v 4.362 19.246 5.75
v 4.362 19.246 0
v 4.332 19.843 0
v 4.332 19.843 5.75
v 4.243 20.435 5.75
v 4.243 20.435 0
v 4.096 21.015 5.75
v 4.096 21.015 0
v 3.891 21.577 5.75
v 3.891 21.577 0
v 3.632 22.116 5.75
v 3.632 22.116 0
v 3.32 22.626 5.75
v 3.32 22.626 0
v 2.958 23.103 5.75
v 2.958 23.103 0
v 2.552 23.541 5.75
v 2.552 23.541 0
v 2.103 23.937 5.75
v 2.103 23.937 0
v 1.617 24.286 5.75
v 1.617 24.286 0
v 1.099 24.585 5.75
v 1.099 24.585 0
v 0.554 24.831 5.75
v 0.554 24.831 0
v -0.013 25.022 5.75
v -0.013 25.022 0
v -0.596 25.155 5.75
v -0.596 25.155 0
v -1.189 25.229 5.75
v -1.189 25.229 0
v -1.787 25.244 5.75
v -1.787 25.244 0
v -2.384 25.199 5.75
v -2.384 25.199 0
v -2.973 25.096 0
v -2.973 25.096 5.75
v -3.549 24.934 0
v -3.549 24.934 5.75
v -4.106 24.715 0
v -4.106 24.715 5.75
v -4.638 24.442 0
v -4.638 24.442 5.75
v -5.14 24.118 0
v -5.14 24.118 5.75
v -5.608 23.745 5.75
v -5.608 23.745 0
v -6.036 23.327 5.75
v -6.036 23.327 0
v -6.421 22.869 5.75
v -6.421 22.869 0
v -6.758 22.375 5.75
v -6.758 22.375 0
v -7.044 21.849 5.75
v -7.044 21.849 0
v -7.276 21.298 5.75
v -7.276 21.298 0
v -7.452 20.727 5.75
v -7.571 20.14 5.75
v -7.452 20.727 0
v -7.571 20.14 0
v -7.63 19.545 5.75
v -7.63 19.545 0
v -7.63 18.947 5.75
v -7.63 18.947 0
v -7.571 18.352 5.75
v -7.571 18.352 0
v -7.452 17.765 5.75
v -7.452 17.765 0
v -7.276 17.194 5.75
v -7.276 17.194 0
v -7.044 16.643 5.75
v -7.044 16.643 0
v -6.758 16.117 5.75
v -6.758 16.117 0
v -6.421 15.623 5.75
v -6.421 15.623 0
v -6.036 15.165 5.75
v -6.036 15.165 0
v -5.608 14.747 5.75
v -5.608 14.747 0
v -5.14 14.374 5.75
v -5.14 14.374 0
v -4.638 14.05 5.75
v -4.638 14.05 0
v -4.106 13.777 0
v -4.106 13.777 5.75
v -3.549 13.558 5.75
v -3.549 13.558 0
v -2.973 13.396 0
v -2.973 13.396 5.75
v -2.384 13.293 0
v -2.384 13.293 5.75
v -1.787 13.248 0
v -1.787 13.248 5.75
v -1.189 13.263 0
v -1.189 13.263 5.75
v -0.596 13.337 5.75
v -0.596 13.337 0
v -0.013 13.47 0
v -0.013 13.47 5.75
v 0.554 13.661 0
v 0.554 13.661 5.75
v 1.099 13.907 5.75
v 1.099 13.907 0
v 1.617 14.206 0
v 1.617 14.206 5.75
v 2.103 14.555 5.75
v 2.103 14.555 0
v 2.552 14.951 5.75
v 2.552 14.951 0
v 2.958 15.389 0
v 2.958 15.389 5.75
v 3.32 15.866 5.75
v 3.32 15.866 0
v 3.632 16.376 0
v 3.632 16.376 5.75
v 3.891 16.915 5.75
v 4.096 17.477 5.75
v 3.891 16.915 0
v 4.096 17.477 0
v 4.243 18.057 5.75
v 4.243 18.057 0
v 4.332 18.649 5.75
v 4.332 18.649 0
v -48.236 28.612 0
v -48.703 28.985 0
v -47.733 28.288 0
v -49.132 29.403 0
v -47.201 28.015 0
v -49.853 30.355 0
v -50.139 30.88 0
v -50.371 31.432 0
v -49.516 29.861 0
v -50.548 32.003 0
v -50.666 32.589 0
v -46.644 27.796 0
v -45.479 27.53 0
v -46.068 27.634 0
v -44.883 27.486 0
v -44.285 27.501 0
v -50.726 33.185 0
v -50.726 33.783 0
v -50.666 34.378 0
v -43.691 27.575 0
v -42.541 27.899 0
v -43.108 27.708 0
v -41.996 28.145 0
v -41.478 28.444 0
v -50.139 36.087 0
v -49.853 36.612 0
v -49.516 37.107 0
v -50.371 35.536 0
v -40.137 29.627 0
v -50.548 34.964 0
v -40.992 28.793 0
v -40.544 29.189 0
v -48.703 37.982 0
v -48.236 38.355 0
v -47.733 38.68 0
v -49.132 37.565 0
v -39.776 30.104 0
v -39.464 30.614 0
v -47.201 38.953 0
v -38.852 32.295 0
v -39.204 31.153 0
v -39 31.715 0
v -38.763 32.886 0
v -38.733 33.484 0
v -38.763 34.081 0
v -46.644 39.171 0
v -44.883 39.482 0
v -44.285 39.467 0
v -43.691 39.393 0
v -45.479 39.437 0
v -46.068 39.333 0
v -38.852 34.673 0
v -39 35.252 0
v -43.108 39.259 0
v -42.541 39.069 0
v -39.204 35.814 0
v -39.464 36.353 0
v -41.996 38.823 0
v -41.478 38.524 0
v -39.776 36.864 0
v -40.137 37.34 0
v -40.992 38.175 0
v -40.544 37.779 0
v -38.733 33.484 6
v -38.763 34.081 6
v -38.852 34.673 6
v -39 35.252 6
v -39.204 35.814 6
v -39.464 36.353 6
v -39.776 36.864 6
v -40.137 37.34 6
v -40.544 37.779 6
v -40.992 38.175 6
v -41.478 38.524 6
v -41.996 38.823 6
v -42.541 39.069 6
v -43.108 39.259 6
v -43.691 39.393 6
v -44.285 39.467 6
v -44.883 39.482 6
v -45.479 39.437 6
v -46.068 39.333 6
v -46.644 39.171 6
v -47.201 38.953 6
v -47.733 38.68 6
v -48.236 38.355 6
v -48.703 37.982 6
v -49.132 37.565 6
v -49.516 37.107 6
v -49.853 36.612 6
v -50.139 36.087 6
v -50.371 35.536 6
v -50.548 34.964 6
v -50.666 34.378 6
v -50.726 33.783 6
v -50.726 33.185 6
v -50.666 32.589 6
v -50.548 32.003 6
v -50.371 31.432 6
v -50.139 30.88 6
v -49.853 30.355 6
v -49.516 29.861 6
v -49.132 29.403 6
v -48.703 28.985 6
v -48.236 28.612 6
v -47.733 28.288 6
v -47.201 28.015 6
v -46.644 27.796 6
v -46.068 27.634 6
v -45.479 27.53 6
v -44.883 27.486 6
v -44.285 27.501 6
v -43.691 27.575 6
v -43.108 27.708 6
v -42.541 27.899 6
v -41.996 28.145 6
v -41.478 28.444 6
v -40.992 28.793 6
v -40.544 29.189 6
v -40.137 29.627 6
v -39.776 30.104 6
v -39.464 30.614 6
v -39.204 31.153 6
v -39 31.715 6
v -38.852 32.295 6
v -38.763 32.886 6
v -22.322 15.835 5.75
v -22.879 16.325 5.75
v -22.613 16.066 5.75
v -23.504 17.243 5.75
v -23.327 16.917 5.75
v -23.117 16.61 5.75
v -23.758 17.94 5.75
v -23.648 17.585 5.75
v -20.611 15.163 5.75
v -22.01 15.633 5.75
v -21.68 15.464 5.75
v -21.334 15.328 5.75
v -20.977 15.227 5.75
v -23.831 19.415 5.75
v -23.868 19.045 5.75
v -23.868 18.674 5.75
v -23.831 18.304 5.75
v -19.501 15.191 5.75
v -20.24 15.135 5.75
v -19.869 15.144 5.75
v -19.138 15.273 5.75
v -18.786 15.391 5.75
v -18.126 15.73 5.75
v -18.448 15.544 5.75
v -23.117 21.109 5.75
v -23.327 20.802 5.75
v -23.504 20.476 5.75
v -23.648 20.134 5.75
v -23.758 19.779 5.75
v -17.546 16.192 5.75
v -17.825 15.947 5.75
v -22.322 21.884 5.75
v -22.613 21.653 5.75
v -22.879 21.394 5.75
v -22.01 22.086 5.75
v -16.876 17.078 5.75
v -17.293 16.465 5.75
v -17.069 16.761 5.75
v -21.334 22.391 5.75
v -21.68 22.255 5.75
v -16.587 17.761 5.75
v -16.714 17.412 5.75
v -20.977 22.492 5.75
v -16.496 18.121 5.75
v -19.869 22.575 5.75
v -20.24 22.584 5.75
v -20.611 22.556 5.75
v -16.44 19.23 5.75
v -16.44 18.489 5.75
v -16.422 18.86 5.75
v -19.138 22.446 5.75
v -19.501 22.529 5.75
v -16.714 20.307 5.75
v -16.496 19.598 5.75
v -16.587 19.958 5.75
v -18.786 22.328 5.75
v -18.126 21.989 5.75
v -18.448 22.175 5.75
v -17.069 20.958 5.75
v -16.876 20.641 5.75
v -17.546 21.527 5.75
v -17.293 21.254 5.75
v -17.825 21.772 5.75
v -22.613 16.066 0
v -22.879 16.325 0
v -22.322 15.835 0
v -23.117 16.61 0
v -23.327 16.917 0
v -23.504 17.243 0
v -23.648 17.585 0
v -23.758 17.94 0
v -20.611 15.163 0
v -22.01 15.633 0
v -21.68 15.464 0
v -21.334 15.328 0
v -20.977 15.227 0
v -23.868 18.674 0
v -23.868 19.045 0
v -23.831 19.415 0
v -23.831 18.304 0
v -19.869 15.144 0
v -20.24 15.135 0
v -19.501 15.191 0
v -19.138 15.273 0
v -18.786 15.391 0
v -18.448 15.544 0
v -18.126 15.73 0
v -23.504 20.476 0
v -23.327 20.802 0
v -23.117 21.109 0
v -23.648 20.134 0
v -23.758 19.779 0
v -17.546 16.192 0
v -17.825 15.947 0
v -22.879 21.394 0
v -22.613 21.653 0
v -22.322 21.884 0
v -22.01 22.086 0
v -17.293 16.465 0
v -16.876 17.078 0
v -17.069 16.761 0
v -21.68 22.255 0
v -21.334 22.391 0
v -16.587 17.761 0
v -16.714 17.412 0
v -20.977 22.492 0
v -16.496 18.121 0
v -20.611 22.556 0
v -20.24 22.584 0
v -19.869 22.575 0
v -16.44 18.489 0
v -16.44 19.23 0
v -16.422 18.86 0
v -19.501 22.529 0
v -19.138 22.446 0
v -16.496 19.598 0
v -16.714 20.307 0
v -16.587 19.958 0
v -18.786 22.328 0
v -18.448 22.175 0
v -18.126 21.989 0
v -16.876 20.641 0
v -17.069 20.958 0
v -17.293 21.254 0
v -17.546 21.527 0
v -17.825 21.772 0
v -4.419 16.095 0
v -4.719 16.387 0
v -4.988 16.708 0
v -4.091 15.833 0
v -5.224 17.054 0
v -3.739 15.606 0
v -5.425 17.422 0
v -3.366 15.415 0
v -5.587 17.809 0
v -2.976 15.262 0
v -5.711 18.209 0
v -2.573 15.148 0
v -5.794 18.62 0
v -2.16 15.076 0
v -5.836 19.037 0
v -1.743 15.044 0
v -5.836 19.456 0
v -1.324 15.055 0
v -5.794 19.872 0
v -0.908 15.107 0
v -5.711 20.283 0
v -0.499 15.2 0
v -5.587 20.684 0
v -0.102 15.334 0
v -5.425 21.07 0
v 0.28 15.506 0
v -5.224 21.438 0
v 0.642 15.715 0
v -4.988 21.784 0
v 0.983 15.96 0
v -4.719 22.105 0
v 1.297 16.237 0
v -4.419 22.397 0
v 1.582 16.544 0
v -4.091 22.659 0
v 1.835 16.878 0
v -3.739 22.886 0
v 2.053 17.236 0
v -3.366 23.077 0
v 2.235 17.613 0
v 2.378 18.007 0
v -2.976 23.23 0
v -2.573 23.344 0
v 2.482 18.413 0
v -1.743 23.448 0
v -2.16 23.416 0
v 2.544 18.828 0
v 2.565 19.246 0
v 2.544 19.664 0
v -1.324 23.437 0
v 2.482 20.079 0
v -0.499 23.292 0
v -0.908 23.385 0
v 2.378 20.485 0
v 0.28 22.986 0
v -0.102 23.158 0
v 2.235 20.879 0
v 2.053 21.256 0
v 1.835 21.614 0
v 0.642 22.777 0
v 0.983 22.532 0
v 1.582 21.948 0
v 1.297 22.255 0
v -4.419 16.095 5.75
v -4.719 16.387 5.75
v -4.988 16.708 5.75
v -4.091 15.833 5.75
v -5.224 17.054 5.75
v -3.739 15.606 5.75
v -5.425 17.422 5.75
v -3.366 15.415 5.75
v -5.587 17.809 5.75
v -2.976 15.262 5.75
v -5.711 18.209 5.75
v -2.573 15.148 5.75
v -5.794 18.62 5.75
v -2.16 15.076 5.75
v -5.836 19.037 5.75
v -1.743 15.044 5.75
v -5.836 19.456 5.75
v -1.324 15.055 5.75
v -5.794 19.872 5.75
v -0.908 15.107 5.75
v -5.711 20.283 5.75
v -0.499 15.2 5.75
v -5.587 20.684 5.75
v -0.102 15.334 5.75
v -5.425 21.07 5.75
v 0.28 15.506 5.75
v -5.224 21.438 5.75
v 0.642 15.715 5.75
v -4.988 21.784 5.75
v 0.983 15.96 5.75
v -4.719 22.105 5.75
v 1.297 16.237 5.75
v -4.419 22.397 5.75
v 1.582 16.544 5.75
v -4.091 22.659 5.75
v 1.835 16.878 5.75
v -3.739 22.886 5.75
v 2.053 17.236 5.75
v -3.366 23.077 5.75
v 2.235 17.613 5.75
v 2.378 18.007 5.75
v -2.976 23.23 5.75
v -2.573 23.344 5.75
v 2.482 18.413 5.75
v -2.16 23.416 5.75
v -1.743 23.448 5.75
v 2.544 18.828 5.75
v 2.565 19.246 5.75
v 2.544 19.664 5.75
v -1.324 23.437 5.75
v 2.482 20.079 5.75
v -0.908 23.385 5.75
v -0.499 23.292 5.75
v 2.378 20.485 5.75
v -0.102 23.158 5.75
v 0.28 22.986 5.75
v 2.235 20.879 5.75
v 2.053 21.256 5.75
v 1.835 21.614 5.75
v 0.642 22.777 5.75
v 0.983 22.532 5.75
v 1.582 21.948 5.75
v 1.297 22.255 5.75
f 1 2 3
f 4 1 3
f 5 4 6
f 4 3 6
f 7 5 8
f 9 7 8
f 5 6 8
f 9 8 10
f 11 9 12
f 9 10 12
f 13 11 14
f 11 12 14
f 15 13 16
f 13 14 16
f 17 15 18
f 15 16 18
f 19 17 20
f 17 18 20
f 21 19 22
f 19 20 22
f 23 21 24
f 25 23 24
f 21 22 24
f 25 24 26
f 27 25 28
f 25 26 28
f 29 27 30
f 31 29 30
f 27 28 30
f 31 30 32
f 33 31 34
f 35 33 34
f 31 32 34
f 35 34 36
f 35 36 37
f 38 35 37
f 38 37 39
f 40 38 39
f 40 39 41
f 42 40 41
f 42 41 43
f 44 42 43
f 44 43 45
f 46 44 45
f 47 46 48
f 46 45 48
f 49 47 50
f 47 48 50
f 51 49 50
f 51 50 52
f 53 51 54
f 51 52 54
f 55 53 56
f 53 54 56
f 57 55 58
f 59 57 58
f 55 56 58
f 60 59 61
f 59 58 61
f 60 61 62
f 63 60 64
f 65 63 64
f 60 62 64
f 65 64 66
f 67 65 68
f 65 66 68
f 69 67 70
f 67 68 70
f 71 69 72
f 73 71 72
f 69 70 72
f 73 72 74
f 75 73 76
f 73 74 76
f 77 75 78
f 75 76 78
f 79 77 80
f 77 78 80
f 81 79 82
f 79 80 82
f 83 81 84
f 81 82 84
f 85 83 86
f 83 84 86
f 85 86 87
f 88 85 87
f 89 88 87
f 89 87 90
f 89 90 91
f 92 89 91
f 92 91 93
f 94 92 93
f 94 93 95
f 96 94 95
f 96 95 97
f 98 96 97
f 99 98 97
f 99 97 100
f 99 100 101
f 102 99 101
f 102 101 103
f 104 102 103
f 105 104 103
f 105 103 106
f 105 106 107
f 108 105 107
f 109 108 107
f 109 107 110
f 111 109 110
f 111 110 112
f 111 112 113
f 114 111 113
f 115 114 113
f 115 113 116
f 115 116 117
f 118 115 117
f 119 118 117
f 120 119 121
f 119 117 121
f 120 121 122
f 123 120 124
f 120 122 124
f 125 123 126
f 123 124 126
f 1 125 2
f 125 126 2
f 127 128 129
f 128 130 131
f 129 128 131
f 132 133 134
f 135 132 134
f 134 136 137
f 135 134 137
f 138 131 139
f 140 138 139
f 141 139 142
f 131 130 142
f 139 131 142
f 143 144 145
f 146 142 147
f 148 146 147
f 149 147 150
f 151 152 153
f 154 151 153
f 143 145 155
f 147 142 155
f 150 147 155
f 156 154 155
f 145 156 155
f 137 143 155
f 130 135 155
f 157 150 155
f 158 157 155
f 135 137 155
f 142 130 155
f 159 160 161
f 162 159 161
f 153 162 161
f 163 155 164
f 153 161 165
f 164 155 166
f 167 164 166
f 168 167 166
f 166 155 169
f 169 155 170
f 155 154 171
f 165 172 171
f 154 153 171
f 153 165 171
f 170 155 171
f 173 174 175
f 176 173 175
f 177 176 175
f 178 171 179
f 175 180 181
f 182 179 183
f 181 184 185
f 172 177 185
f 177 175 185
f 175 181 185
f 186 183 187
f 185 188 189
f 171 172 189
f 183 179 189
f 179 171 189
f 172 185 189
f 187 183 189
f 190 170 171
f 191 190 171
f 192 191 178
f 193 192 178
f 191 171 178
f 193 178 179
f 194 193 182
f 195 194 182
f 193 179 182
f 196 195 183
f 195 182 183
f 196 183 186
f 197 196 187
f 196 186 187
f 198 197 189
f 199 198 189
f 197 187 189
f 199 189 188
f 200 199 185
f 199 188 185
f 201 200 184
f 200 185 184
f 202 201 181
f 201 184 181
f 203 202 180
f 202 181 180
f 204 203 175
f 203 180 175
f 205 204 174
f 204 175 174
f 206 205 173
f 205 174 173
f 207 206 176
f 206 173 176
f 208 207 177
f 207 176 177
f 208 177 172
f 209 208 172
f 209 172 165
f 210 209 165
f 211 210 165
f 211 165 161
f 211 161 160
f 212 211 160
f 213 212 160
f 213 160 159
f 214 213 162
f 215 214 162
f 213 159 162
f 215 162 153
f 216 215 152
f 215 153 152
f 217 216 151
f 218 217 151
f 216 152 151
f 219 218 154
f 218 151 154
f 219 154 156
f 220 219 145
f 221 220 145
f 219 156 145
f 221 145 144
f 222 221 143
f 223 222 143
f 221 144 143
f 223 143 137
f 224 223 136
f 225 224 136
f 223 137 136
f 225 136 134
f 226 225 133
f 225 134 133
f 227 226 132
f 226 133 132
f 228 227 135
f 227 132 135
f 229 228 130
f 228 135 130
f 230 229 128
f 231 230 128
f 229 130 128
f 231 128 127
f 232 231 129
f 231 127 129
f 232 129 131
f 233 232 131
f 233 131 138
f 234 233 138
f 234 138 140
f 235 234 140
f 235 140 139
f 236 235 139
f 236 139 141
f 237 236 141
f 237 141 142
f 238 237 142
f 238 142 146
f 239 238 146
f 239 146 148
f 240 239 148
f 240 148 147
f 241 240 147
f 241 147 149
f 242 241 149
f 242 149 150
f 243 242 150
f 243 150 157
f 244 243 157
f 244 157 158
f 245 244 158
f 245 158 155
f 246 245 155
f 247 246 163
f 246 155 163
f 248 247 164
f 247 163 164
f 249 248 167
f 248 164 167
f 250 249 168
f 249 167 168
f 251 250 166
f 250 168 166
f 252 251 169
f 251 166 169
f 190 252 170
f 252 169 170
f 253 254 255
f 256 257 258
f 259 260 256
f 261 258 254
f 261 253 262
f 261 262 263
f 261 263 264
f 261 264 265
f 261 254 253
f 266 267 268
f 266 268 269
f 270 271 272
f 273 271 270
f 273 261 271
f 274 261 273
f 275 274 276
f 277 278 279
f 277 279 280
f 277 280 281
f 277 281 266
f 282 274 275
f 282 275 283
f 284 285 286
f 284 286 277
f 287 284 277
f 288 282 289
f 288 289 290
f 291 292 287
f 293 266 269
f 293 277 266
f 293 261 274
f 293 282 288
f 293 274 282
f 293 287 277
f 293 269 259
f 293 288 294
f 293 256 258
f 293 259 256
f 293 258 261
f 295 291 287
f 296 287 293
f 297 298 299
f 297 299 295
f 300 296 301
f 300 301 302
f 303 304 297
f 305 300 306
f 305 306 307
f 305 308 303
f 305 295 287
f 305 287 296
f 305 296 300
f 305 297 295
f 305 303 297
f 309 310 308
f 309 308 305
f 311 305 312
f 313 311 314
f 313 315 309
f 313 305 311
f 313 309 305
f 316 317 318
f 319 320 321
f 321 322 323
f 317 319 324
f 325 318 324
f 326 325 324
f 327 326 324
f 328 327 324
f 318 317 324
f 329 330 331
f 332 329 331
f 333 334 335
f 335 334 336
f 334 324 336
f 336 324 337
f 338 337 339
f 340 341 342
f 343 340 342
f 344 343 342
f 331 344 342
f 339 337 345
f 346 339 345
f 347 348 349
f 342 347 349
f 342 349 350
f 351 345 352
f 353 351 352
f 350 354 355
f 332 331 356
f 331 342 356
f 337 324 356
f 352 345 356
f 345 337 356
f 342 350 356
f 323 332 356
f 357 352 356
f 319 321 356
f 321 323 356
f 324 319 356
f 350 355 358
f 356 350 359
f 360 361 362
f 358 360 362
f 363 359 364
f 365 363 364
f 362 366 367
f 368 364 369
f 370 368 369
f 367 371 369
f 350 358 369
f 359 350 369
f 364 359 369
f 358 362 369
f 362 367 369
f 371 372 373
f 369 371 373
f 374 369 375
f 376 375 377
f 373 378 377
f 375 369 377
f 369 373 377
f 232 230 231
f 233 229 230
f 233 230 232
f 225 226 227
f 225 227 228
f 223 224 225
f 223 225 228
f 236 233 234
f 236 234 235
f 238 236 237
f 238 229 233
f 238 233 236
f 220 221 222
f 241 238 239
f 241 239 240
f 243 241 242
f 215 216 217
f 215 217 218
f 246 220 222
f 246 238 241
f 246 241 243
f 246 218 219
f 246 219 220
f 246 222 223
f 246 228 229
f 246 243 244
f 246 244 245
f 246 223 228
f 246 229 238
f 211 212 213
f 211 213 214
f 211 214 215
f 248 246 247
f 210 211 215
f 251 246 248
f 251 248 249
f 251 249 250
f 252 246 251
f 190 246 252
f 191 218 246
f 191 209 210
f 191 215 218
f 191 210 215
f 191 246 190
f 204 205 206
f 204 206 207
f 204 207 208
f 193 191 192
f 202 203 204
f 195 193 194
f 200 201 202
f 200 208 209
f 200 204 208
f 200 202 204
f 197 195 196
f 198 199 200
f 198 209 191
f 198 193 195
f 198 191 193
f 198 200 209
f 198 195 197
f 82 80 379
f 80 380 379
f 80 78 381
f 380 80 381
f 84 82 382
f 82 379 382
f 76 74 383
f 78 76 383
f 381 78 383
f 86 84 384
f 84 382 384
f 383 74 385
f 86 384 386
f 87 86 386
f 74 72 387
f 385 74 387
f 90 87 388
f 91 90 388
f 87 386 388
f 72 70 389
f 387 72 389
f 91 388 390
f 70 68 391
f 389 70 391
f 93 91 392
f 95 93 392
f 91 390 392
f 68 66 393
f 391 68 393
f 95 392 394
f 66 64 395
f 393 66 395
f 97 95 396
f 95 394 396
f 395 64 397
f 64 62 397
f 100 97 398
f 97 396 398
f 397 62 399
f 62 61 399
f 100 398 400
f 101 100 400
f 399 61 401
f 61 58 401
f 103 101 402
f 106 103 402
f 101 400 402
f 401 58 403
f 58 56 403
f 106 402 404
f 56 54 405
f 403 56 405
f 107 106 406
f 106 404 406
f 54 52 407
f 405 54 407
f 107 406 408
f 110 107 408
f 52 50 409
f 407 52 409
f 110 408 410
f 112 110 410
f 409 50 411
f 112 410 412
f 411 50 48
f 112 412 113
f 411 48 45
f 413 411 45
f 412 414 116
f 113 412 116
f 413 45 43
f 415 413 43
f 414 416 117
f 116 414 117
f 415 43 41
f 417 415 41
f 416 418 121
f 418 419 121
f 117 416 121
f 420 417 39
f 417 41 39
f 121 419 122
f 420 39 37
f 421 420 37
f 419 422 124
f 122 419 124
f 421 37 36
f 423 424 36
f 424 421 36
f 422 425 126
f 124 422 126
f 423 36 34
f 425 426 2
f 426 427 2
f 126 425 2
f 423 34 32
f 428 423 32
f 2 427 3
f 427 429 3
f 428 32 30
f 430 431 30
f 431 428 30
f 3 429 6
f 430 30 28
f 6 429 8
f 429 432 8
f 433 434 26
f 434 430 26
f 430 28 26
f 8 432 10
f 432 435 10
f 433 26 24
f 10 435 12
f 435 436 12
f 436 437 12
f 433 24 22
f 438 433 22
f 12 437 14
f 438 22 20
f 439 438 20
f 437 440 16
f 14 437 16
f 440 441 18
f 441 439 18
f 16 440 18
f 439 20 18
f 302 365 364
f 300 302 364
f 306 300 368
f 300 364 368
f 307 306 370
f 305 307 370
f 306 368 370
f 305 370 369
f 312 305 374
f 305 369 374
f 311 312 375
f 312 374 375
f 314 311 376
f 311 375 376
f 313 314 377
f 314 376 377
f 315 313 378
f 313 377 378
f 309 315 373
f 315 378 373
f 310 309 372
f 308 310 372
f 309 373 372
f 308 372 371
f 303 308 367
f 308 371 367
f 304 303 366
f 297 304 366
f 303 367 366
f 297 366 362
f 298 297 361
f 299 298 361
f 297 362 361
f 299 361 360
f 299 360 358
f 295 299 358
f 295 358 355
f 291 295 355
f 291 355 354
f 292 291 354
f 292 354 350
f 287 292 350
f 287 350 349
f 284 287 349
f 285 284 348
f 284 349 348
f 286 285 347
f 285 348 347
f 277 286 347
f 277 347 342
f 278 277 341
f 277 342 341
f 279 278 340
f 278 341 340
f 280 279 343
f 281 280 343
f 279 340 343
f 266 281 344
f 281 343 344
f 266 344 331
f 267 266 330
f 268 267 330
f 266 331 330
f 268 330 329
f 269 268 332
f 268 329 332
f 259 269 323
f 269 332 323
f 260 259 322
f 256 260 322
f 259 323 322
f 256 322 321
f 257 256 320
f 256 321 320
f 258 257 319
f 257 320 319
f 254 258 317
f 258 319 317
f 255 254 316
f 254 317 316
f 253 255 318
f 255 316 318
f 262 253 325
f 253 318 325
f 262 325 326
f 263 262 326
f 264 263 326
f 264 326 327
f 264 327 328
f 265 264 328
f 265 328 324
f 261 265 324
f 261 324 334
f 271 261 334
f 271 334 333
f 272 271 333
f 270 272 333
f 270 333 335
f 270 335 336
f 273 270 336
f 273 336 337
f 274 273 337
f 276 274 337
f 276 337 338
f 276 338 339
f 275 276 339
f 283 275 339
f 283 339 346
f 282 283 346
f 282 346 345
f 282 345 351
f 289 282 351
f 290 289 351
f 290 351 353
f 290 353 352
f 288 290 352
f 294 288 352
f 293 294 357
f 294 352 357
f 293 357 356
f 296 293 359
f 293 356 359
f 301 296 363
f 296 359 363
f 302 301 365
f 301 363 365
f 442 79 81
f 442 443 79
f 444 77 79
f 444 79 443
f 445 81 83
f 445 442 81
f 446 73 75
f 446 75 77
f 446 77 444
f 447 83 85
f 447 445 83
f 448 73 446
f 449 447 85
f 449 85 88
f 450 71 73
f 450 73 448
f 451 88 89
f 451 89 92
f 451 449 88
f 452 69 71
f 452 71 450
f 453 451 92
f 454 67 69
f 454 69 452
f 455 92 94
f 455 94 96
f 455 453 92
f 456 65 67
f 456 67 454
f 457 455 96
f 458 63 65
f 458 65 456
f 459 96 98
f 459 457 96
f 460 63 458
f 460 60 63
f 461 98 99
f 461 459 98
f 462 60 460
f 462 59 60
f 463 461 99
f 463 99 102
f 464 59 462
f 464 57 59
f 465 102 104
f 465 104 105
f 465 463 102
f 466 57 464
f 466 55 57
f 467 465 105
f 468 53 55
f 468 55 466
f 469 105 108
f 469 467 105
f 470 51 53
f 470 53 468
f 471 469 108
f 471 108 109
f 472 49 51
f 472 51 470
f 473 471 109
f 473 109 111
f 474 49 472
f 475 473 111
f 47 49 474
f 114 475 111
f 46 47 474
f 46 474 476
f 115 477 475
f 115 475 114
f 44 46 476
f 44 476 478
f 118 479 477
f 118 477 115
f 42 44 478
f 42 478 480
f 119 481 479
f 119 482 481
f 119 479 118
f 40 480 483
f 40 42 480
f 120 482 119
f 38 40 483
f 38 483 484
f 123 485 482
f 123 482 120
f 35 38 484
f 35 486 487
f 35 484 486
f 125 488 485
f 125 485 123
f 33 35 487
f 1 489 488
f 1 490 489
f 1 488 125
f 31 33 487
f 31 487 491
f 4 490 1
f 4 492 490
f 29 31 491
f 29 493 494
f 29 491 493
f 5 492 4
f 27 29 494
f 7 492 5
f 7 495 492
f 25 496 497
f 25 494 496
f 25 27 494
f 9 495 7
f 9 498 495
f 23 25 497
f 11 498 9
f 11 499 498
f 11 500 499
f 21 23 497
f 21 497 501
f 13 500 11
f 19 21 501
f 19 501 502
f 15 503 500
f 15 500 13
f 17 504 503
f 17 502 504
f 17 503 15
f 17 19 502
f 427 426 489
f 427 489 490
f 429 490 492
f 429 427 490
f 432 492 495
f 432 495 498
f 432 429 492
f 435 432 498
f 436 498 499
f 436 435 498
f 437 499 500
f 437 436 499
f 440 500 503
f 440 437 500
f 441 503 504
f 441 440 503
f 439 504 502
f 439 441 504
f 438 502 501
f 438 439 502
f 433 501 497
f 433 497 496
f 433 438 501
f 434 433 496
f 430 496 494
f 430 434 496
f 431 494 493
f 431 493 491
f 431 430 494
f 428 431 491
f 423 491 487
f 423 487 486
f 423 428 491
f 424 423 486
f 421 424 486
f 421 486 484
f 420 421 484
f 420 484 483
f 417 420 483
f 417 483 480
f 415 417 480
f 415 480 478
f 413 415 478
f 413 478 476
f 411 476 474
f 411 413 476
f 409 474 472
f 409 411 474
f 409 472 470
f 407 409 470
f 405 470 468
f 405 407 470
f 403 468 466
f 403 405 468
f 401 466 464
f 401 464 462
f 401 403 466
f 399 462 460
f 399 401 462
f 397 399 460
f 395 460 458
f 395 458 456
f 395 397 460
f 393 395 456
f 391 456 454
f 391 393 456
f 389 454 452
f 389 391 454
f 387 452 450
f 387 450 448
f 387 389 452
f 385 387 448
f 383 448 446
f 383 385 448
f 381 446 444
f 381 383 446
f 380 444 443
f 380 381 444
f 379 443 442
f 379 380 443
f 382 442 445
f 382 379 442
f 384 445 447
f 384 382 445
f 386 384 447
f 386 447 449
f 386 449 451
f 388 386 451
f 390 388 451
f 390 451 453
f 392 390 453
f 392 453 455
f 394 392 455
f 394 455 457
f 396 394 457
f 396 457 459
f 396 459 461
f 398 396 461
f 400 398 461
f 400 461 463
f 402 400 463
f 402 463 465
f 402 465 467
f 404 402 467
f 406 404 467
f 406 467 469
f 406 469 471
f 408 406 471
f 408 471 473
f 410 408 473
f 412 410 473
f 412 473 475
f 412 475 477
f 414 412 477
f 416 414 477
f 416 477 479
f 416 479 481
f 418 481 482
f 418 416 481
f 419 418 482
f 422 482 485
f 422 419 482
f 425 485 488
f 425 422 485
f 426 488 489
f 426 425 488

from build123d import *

# Parameters (mm, degrees)
F0_R     = 6
F1_DEPTH = 6
F2_R     = 6
F2_R_2   = 4.202992
F2_R_3   = 3.725621
F3_DEPTH = 5.75


with BuildPart() as f1:
    # F0 (on Top) → F1 (new body)
    with BuildSketch(Plane.XY):
        with Locations((-44.733342, 33.483744)):
            Circle(F0_R)
    extrude(amount=F1_DEPTH)


with BuildPart() as f3:
    # F2 (on Top) → F3 (new body)
    with BuildSketch(Plane.XY):
        with Locations((-1.63782, 19.246012)):
            Circle(F2_R)
        with Locations((-1.63782, 19.246012)):
            Circle(F2_R_2, mode=Mode.SUBTRACT)
        with Locations((-20.147489, 18.859522)):
            Circle(F2_R_3)
    extrude(amount=F3_DEPTH)


solid = Compound([f1.part, f3.part])
